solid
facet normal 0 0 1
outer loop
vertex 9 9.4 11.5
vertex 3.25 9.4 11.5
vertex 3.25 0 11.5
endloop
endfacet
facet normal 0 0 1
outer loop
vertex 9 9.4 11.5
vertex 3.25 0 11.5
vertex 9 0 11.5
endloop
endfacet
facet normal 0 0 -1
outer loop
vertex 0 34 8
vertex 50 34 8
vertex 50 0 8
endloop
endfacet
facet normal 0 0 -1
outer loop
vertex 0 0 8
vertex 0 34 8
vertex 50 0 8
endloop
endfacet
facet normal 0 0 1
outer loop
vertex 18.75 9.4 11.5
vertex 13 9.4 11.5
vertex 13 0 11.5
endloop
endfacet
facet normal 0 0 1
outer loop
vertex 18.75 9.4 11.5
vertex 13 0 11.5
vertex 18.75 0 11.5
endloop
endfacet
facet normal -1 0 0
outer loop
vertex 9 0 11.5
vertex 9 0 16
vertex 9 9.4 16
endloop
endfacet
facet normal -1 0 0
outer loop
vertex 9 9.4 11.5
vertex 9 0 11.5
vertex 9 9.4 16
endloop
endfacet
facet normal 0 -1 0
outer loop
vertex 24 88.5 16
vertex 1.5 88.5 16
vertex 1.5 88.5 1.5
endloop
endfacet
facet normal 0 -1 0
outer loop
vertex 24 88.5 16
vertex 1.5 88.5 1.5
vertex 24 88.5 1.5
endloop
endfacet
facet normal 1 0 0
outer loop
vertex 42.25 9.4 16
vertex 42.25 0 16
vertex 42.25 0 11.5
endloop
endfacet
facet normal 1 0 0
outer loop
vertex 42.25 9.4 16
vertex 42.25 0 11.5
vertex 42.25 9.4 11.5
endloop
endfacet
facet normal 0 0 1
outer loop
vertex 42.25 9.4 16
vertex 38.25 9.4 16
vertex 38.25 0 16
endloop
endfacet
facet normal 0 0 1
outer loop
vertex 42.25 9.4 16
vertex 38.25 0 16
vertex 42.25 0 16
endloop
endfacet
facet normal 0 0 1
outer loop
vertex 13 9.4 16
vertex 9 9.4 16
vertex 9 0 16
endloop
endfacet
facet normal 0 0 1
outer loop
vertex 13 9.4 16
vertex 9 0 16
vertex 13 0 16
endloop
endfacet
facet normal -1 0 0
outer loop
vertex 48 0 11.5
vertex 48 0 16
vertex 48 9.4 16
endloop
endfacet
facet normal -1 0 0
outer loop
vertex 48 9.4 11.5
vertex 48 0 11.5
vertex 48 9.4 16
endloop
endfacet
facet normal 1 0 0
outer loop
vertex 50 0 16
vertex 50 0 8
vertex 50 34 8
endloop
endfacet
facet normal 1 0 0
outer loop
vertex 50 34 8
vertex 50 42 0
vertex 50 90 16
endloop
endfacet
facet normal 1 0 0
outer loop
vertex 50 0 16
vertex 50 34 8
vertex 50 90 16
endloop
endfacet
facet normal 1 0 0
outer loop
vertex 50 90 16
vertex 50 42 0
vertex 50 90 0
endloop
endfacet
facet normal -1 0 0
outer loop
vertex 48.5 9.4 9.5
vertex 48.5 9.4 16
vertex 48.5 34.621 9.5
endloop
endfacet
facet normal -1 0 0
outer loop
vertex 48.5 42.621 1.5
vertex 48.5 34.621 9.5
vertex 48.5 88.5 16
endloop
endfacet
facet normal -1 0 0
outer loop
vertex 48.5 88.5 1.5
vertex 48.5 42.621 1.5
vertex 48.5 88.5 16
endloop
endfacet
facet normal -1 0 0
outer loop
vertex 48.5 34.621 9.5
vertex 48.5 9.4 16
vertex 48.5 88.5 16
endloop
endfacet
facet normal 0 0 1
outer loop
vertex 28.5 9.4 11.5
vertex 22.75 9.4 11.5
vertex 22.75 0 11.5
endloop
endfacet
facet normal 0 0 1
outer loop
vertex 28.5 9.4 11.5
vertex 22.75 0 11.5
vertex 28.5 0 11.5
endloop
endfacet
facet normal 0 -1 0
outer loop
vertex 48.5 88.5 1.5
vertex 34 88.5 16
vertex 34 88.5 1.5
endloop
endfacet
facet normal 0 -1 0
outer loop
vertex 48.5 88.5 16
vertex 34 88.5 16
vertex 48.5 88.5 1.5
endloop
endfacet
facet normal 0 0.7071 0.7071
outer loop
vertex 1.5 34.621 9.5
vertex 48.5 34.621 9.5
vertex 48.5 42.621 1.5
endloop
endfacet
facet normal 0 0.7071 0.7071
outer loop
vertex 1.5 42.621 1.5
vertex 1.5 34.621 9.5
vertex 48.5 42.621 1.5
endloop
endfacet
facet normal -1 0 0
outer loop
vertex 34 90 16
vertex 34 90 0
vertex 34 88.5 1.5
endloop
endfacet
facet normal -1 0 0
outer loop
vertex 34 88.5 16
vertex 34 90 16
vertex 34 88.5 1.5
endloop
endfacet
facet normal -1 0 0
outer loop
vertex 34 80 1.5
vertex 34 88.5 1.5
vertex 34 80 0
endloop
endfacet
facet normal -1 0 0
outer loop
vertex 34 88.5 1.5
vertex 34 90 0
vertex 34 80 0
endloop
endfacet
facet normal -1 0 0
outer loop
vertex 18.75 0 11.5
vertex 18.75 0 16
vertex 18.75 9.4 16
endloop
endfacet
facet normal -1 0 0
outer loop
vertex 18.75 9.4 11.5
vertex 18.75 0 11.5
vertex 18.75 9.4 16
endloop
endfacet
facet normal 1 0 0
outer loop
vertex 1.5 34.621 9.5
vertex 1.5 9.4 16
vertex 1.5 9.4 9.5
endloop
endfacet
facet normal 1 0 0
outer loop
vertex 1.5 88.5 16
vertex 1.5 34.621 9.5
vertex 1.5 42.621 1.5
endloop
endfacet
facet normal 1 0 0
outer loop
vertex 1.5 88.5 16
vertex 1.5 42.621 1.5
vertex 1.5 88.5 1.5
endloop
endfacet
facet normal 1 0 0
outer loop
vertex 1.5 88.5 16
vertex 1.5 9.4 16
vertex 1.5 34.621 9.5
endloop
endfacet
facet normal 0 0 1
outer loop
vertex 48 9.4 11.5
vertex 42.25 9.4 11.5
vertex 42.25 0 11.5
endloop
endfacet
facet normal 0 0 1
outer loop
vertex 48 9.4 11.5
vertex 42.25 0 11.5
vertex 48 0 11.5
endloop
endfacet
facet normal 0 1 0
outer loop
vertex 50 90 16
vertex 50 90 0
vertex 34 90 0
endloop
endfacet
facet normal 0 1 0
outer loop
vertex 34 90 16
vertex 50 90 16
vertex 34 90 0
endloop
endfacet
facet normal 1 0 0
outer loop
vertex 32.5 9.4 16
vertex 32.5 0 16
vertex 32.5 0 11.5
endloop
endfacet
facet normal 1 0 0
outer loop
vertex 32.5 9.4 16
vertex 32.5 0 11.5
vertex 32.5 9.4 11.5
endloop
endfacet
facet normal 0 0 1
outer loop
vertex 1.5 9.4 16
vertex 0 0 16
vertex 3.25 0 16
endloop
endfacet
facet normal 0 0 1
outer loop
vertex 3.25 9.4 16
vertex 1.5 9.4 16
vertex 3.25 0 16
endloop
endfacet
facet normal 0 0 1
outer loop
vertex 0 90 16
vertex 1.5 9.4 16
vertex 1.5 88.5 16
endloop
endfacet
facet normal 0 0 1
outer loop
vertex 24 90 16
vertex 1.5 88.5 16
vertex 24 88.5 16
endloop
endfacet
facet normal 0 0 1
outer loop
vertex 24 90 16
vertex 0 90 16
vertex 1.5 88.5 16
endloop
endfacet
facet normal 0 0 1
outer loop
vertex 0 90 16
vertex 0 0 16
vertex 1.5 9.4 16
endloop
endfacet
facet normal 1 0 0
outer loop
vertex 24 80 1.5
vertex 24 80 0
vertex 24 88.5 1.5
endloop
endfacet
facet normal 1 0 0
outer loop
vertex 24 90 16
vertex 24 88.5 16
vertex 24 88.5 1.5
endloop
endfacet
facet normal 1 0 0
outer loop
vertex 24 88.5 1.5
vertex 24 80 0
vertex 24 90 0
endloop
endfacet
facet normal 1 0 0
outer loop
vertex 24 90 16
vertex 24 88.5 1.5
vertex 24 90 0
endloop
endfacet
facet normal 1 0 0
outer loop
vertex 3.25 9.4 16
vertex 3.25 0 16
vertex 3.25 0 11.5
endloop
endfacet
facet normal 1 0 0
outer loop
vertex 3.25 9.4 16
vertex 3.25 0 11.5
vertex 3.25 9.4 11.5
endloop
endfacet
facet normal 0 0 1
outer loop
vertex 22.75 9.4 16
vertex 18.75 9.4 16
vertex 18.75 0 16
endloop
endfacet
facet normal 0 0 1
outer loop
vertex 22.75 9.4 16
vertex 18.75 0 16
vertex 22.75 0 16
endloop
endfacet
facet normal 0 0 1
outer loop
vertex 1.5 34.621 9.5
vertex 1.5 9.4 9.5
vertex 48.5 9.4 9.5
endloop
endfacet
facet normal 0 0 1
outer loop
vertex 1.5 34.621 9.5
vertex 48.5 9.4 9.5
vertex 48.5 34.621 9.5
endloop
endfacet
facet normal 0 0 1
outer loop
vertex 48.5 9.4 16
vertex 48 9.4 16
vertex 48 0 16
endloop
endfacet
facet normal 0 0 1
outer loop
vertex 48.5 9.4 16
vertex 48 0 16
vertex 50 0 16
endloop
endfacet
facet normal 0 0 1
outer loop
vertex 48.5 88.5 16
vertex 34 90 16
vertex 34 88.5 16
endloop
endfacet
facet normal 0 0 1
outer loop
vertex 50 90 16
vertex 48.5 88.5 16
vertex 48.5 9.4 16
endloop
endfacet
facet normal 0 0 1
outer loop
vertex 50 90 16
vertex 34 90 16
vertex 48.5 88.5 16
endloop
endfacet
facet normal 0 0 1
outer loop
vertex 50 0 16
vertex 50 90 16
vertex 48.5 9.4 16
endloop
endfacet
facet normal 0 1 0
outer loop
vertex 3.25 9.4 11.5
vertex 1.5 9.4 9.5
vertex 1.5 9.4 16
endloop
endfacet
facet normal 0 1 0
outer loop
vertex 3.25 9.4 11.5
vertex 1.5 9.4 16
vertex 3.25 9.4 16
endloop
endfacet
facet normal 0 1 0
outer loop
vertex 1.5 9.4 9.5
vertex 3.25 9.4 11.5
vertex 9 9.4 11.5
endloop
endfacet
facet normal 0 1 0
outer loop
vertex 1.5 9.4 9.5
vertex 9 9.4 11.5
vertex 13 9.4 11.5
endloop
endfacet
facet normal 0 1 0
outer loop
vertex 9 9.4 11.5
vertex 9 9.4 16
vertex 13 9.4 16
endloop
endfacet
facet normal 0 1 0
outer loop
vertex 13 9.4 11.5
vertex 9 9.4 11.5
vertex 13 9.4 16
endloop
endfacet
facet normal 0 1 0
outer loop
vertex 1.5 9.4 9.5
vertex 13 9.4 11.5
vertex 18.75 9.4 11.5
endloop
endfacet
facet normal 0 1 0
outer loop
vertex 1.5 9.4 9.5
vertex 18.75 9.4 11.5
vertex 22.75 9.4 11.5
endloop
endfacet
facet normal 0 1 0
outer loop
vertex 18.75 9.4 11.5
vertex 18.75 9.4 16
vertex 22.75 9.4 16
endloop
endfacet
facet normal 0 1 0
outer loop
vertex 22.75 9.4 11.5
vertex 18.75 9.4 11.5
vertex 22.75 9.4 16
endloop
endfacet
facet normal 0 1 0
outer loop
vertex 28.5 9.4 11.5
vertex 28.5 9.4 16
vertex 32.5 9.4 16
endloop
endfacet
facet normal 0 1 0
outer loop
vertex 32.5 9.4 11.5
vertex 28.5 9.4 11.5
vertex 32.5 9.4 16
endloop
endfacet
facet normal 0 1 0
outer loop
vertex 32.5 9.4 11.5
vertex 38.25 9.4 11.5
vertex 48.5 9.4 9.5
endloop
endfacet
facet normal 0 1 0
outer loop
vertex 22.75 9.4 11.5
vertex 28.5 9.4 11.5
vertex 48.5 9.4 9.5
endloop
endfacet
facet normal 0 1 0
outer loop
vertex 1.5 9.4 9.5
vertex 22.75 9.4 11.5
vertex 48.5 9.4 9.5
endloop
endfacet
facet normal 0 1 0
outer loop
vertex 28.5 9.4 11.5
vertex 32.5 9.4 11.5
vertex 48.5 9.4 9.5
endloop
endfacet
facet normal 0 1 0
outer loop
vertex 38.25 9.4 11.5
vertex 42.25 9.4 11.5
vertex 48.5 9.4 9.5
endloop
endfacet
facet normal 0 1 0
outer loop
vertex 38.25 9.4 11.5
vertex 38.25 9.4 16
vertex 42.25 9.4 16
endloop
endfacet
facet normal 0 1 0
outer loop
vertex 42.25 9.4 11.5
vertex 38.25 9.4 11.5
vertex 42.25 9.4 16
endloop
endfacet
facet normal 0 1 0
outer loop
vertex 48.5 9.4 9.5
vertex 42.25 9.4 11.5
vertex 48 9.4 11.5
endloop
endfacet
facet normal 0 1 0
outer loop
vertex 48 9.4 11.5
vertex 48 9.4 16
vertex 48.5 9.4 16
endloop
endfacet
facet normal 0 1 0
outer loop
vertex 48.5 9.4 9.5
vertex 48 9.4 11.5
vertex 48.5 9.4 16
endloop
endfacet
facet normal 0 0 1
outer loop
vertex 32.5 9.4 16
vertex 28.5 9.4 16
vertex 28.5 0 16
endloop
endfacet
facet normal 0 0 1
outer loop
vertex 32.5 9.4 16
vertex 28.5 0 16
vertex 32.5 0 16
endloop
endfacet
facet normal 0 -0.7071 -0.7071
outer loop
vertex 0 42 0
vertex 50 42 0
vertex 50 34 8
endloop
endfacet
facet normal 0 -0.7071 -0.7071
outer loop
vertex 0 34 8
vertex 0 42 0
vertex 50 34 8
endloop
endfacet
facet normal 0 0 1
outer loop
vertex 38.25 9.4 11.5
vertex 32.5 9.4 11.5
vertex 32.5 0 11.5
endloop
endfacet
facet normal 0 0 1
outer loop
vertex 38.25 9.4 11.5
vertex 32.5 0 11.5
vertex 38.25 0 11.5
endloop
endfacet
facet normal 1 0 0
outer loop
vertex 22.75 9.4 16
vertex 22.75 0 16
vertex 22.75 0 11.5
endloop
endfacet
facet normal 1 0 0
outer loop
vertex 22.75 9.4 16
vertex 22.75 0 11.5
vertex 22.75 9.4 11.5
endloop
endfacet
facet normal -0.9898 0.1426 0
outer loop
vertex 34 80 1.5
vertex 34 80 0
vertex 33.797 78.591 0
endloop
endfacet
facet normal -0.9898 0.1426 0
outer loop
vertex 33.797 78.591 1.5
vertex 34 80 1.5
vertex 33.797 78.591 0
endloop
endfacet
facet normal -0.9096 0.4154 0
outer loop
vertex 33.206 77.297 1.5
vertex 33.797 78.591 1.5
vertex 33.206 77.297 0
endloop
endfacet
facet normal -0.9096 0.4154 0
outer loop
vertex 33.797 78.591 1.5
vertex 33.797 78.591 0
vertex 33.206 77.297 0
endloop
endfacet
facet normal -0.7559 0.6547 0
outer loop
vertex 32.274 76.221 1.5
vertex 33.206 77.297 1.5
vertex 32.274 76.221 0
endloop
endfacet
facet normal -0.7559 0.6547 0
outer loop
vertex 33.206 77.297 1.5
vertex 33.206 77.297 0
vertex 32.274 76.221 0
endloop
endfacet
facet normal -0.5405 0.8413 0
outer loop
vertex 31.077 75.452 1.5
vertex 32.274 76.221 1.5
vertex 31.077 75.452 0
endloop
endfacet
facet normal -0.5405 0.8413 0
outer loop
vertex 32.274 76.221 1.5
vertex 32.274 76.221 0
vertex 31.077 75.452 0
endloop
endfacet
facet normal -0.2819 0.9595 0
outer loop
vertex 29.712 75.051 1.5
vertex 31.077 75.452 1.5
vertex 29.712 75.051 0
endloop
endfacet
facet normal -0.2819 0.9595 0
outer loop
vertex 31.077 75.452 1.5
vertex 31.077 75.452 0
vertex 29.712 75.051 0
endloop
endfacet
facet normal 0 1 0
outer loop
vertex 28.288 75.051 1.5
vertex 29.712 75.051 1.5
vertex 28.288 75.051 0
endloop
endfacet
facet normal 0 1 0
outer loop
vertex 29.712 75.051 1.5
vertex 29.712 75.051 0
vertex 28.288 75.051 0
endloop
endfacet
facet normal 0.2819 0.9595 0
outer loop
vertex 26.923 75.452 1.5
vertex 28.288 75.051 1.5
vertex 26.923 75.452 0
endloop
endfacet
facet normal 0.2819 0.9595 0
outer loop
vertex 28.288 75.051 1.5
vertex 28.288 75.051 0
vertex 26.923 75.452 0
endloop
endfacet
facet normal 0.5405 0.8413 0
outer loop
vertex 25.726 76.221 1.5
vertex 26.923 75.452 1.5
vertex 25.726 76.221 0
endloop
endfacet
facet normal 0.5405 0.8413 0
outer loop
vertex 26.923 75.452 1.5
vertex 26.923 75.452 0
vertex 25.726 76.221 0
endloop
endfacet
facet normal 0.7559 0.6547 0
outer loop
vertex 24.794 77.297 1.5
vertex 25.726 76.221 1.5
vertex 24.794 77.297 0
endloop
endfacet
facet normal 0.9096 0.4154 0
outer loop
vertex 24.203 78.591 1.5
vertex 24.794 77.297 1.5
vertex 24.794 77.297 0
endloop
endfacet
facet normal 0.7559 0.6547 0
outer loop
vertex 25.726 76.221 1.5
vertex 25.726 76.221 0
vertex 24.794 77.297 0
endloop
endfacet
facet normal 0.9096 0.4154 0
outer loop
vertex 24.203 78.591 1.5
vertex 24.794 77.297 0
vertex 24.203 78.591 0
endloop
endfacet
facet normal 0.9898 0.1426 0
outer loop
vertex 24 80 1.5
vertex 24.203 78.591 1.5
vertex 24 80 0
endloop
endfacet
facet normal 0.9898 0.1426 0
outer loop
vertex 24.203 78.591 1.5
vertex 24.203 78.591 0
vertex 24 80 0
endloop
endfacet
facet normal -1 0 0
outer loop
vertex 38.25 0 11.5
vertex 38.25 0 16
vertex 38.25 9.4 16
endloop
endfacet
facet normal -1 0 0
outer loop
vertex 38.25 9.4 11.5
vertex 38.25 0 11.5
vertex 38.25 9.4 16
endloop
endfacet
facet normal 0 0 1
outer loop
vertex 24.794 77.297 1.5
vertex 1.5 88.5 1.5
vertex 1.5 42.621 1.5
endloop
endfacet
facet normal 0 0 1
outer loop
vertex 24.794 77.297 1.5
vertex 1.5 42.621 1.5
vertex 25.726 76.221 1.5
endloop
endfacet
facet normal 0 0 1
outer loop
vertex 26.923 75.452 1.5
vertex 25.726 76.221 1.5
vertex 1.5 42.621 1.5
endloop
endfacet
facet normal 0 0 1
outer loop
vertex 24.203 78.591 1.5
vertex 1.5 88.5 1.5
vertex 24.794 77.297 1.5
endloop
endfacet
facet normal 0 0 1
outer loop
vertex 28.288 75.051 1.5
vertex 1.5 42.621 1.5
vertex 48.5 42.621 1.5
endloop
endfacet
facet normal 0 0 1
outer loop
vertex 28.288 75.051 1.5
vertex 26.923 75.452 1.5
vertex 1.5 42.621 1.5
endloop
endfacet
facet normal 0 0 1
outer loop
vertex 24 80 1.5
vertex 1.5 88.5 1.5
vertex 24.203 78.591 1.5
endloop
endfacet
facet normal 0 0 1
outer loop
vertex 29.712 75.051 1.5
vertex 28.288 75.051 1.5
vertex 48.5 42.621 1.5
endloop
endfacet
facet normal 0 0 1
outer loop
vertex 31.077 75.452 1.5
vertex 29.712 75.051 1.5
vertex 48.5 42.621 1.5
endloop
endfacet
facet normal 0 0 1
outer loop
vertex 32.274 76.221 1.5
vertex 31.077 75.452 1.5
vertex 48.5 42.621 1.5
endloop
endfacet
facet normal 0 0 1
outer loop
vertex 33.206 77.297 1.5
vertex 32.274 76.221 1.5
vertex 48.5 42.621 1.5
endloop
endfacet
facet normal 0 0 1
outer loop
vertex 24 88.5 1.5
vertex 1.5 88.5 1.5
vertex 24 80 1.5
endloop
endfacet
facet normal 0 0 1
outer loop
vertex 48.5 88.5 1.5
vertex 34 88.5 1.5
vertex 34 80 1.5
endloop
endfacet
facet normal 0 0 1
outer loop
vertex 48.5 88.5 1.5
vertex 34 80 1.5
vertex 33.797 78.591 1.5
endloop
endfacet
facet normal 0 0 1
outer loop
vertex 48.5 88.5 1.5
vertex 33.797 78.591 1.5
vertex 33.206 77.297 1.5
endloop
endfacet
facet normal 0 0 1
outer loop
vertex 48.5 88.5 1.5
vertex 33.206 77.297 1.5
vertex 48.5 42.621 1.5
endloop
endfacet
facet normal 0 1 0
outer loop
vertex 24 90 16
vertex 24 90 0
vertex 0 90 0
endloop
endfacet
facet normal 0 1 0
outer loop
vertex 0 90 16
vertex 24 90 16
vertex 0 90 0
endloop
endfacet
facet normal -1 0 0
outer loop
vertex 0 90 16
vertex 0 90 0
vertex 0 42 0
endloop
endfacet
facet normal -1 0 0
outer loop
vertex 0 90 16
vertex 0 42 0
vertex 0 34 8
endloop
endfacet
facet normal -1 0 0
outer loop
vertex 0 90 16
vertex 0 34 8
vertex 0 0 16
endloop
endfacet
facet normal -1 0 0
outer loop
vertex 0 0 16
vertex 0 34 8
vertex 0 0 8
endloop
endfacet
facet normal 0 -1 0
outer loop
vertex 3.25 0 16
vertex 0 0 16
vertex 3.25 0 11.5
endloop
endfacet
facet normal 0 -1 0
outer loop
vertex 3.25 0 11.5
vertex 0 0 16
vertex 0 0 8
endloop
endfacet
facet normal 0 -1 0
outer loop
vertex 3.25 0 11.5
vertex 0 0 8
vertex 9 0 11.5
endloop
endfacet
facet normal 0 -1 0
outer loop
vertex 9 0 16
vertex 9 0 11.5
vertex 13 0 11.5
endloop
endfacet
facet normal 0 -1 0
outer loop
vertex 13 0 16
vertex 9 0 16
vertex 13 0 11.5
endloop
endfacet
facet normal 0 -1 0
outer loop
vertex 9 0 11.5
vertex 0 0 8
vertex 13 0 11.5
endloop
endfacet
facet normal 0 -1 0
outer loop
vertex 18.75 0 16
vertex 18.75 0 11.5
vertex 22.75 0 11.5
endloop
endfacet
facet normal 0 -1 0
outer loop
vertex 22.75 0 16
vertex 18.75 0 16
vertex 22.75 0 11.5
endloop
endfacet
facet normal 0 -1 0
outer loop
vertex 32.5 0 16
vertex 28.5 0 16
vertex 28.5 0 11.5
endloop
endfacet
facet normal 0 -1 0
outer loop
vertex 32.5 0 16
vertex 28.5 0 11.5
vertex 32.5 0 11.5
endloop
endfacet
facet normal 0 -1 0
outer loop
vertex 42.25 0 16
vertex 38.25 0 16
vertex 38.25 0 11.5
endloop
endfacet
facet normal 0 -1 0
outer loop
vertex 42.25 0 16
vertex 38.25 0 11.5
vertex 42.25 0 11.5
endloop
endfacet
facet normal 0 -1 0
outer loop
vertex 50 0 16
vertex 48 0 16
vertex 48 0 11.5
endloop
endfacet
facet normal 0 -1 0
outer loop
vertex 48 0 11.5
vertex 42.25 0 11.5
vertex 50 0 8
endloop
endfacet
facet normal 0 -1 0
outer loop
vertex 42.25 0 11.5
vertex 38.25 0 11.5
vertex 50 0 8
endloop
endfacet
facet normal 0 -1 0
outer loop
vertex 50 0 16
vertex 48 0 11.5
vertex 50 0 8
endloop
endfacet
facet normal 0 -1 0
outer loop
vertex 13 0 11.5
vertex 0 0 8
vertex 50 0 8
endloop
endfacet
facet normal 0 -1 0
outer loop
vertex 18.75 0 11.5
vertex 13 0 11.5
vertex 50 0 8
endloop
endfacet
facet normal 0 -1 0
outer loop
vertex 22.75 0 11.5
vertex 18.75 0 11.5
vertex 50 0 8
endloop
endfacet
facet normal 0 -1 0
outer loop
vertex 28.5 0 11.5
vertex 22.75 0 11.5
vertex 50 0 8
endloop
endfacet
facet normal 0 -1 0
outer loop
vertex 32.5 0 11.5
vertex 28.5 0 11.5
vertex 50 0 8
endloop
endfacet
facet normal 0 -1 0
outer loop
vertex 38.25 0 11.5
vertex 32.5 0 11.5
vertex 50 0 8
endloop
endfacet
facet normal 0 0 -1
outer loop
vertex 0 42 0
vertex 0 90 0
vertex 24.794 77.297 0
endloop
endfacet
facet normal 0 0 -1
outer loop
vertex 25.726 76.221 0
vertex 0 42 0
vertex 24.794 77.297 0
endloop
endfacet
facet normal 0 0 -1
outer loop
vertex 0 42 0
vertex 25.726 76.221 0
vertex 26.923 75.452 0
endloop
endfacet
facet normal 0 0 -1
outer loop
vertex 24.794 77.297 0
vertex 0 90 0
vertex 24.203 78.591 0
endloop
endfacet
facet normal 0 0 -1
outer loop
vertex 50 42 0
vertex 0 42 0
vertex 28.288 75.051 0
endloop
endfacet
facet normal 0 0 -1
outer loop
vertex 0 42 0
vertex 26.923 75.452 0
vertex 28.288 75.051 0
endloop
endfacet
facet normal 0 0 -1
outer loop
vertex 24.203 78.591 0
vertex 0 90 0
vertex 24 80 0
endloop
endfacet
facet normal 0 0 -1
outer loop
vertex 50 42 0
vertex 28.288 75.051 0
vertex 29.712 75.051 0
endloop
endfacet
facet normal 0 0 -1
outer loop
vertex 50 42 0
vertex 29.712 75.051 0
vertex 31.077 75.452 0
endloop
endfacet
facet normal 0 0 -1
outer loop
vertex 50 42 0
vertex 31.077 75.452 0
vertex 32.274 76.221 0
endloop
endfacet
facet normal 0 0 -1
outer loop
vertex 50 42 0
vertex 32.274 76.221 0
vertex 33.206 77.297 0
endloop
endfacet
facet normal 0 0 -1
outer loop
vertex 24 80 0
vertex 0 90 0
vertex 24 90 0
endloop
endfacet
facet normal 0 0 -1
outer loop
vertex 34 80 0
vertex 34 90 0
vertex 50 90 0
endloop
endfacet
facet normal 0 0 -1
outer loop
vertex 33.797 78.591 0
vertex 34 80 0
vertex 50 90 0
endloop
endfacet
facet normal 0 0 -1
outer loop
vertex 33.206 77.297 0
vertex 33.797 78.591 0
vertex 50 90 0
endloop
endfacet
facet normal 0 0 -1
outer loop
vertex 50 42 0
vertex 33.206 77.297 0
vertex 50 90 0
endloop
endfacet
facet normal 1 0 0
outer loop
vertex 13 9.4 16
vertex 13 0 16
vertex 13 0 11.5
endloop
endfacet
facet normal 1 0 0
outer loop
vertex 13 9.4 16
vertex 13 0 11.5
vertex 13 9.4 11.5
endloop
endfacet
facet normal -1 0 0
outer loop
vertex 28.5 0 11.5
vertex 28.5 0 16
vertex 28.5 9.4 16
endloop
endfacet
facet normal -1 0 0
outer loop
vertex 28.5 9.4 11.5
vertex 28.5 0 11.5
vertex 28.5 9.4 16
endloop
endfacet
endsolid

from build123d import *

# Parameters (mm, degrees)
F1_DEPTH = 16
F2_W     = 47
F2_H     = 79.1
F3_DEPTH = 14.5
F4_W     = 5.75
F4_H     = 9.4
F5_DEPTH = 4.5
F7_DEPTH = 50.001
F9_DEPTH = 48.5


with BuildPart() as f1:
    # F0 (on Top) → F1 (new body)
    with BuildSketch(Plane.XY):
        with BuildLine():
            Line((0, 90), (0, 0))
            Line((0, 0), (50, 0))
            Line((50, 0), (50, 90))
            Line((50, 90), (34, 90))
            Line((34, 90), (34, 80))
            ThreePointArc((34, 80), (29, 75), (24, 80))
            Line((24, 80), (24, 90))
            Line((24, 90), (0, 90))
        make_face()
    extrude(amount=F1_DEPTH)

    # F2 (on face) → F3 (cut, through all)
    with BuildSketch(Plane.XY.offset(16)):
        with Locations((25, 48.95)):
            Rectangle(F2_W, F2_H)
    extrude(amount=-F3_DEPTH, mode=Mode.SUBTRACT)

    # F4 (on face) → F5 (cut)
    with BuildSketch(Plane.XY.offset(16)):
        with Locations((45.125, 4.7)):
            Rectangle(F4_W, F4_H)
        with Locations((35.375, 4.7)):
            Rectangle(F4_W, F4_H)
        with Locations((25.625, 4.7)):
            Rectangle(F4_W, F4_H)
        with Locations((15.875, 4.7)):
            Rectangle(F4_W, F4_H)
        with Locations((6.125, 4.7)):
            Rectangle(F4_W, F4_H)
    extrude(amount=-F5_DEPTH, mode=Mode.SUBTRACT)

    # F6 (on face) → F7 (cut, through all)
    with BuildSketch(Plane.YZ.offset(50)):
        Polygon((0, 8), (0, 0), (42, 0), (34, 8), align=None)
    extrude(amount=-F7_DEPTH, mode=Mode.SUBTRACT)

    # F8 (on face) → F9 (join, through all)
    with BuildSketch(Plane(origin=(0, 0, 0), x_dir=(0, -1, 0), z_dir=(-1, 0, 0))):
        Polygon((-42, 0), (-34, 8), (0, 8), (0, 9.5), (-34.6213203436, 9.5), (-44.1213203436, 0), align=None)
    extrude(amount=-F9_DEPTH)


solid = f1.part
